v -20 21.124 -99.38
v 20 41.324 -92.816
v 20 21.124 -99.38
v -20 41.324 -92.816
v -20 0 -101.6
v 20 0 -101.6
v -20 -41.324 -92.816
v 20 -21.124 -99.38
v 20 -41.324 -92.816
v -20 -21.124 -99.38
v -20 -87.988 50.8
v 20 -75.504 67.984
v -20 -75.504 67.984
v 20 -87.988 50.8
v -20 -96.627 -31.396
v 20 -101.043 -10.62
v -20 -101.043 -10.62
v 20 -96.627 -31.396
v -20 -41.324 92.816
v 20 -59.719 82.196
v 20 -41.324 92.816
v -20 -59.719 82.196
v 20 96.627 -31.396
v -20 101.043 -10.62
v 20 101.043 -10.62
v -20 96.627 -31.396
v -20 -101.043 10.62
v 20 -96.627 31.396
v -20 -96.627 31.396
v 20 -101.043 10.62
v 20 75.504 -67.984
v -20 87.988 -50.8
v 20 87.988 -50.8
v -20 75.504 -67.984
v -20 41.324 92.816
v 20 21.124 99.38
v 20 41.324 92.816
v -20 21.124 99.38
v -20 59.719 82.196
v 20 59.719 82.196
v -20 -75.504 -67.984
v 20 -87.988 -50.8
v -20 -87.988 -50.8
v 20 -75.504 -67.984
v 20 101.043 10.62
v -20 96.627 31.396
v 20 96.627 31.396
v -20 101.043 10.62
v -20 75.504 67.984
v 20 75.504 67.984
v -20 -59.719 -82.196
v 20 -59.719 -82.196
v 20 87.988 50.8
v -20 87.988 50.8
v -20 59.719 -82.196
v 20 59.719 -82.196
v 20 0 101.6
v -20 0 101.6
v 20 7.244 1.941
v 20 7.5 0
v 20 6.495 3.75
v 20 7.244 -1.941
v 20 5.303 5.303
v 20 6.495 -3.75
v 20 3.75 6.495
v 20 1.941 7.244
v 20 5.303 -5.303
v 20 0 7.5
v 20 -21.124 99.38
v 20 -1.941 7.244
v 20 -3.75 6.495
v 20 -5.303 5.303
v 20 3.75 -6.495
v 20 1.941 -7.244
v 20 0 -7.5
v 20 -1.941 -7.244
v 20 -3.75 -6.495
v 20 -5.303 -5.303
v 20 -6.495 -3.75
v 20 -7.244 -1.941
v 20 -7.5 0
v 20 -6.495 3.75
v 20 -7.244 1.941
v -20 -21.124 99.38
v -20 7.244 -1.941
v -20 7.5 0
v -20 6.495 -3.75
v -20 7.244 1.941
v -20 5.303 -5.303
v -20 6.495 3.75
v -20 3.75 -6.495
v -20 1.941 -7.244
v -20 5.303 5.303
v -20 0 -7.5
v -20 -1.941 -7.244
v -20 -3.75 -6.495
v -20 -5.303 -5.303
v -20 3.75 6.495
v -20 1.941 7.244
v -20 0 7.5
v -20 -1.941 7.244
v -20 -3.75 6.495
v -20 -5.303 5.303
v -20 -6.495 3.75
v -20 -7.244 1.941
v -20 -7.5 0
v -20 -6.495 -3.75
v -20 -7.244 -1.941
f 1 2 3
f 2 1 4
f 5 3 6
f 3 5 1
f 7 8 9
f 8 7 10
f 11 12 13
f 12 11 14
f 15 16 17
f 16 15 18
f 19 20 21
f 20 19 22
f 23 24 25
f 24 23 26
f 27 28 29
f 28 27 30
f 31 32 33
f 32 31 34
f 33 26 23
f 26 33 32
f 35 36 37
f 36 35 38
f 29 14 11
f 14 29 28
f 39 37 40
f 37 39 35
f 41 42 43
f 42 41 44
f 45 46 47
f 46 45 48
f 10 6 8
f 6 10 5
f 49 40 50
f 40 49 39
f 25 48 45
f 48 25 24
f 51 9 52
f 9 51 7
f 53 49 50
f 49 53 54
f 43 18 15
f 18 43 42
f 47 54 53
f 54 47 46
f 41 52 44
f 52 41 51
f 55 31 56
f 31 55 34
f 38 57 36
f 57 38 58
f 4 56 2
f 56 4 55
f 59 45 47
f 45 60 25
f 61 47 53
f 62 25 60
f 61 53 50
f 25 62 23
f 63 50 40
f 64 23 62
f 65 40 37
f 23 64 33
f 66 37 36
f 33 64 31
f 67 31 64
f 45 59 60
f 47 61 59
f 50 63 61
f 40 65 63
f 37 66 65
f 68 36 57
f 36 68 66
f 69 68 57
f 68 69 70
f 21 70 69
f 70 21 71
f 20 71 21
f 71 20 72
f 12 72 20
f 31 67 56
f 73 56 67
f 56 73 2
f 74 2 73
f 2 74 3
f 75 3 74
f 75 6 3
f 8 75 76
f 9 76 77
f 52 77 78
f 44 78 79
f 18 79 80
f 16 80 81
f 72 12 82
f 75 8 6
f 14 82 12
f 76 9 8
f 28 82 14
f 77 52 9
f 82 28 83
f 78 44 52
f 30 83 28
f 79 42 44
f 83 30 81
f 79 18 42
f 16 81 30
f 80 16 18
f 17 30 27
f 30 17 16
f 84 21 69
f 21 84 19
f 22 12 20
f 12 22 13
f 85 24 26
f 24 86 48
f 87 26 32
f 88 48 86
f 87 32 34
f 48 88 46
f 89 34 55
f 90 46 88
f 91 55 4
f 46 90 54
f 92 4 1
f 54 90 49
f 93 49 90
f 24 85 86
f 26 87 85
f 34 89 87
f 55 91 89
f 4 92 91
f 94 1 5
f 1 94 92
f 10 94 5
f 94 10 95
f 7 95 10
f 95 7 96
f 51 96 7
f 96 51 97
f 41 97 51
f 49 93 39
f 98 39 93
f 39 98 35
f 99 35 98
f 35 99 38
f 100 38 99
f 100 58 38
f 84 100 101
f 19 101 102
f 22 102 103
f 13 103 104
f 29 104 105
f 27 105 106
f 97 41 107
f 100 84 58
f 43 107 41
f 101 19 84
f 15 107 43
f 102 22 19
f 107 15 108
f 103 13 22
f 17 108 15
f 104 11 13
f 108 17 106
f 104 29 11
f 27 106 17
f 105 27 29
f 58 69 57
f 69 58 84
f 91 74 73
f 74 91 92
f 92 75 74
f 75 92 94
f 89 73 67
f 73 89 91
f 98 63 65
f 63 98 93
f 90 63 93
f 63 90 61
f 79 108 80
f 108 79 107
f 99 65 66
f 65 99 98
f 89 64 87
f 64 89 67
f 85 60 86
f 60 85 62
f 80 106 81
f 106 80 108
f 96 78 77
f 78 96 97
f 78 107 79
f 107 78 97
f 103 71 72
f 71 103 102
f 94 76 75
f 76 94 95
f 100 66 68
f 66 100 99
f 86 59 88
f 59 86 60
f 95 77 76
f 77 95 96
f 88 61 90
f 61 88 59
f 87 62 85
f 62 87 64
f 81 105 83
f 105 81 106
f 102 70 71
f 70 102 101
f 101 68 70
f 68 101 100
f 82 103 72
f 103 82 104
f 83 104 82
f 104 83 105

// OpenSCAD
inch = 25.4;
rotate([0, 90, 0])
difference(){
  cylinder(d=8*inch, h=40, center=true);
  cylinder(d=15, h=42, center=true);
}
